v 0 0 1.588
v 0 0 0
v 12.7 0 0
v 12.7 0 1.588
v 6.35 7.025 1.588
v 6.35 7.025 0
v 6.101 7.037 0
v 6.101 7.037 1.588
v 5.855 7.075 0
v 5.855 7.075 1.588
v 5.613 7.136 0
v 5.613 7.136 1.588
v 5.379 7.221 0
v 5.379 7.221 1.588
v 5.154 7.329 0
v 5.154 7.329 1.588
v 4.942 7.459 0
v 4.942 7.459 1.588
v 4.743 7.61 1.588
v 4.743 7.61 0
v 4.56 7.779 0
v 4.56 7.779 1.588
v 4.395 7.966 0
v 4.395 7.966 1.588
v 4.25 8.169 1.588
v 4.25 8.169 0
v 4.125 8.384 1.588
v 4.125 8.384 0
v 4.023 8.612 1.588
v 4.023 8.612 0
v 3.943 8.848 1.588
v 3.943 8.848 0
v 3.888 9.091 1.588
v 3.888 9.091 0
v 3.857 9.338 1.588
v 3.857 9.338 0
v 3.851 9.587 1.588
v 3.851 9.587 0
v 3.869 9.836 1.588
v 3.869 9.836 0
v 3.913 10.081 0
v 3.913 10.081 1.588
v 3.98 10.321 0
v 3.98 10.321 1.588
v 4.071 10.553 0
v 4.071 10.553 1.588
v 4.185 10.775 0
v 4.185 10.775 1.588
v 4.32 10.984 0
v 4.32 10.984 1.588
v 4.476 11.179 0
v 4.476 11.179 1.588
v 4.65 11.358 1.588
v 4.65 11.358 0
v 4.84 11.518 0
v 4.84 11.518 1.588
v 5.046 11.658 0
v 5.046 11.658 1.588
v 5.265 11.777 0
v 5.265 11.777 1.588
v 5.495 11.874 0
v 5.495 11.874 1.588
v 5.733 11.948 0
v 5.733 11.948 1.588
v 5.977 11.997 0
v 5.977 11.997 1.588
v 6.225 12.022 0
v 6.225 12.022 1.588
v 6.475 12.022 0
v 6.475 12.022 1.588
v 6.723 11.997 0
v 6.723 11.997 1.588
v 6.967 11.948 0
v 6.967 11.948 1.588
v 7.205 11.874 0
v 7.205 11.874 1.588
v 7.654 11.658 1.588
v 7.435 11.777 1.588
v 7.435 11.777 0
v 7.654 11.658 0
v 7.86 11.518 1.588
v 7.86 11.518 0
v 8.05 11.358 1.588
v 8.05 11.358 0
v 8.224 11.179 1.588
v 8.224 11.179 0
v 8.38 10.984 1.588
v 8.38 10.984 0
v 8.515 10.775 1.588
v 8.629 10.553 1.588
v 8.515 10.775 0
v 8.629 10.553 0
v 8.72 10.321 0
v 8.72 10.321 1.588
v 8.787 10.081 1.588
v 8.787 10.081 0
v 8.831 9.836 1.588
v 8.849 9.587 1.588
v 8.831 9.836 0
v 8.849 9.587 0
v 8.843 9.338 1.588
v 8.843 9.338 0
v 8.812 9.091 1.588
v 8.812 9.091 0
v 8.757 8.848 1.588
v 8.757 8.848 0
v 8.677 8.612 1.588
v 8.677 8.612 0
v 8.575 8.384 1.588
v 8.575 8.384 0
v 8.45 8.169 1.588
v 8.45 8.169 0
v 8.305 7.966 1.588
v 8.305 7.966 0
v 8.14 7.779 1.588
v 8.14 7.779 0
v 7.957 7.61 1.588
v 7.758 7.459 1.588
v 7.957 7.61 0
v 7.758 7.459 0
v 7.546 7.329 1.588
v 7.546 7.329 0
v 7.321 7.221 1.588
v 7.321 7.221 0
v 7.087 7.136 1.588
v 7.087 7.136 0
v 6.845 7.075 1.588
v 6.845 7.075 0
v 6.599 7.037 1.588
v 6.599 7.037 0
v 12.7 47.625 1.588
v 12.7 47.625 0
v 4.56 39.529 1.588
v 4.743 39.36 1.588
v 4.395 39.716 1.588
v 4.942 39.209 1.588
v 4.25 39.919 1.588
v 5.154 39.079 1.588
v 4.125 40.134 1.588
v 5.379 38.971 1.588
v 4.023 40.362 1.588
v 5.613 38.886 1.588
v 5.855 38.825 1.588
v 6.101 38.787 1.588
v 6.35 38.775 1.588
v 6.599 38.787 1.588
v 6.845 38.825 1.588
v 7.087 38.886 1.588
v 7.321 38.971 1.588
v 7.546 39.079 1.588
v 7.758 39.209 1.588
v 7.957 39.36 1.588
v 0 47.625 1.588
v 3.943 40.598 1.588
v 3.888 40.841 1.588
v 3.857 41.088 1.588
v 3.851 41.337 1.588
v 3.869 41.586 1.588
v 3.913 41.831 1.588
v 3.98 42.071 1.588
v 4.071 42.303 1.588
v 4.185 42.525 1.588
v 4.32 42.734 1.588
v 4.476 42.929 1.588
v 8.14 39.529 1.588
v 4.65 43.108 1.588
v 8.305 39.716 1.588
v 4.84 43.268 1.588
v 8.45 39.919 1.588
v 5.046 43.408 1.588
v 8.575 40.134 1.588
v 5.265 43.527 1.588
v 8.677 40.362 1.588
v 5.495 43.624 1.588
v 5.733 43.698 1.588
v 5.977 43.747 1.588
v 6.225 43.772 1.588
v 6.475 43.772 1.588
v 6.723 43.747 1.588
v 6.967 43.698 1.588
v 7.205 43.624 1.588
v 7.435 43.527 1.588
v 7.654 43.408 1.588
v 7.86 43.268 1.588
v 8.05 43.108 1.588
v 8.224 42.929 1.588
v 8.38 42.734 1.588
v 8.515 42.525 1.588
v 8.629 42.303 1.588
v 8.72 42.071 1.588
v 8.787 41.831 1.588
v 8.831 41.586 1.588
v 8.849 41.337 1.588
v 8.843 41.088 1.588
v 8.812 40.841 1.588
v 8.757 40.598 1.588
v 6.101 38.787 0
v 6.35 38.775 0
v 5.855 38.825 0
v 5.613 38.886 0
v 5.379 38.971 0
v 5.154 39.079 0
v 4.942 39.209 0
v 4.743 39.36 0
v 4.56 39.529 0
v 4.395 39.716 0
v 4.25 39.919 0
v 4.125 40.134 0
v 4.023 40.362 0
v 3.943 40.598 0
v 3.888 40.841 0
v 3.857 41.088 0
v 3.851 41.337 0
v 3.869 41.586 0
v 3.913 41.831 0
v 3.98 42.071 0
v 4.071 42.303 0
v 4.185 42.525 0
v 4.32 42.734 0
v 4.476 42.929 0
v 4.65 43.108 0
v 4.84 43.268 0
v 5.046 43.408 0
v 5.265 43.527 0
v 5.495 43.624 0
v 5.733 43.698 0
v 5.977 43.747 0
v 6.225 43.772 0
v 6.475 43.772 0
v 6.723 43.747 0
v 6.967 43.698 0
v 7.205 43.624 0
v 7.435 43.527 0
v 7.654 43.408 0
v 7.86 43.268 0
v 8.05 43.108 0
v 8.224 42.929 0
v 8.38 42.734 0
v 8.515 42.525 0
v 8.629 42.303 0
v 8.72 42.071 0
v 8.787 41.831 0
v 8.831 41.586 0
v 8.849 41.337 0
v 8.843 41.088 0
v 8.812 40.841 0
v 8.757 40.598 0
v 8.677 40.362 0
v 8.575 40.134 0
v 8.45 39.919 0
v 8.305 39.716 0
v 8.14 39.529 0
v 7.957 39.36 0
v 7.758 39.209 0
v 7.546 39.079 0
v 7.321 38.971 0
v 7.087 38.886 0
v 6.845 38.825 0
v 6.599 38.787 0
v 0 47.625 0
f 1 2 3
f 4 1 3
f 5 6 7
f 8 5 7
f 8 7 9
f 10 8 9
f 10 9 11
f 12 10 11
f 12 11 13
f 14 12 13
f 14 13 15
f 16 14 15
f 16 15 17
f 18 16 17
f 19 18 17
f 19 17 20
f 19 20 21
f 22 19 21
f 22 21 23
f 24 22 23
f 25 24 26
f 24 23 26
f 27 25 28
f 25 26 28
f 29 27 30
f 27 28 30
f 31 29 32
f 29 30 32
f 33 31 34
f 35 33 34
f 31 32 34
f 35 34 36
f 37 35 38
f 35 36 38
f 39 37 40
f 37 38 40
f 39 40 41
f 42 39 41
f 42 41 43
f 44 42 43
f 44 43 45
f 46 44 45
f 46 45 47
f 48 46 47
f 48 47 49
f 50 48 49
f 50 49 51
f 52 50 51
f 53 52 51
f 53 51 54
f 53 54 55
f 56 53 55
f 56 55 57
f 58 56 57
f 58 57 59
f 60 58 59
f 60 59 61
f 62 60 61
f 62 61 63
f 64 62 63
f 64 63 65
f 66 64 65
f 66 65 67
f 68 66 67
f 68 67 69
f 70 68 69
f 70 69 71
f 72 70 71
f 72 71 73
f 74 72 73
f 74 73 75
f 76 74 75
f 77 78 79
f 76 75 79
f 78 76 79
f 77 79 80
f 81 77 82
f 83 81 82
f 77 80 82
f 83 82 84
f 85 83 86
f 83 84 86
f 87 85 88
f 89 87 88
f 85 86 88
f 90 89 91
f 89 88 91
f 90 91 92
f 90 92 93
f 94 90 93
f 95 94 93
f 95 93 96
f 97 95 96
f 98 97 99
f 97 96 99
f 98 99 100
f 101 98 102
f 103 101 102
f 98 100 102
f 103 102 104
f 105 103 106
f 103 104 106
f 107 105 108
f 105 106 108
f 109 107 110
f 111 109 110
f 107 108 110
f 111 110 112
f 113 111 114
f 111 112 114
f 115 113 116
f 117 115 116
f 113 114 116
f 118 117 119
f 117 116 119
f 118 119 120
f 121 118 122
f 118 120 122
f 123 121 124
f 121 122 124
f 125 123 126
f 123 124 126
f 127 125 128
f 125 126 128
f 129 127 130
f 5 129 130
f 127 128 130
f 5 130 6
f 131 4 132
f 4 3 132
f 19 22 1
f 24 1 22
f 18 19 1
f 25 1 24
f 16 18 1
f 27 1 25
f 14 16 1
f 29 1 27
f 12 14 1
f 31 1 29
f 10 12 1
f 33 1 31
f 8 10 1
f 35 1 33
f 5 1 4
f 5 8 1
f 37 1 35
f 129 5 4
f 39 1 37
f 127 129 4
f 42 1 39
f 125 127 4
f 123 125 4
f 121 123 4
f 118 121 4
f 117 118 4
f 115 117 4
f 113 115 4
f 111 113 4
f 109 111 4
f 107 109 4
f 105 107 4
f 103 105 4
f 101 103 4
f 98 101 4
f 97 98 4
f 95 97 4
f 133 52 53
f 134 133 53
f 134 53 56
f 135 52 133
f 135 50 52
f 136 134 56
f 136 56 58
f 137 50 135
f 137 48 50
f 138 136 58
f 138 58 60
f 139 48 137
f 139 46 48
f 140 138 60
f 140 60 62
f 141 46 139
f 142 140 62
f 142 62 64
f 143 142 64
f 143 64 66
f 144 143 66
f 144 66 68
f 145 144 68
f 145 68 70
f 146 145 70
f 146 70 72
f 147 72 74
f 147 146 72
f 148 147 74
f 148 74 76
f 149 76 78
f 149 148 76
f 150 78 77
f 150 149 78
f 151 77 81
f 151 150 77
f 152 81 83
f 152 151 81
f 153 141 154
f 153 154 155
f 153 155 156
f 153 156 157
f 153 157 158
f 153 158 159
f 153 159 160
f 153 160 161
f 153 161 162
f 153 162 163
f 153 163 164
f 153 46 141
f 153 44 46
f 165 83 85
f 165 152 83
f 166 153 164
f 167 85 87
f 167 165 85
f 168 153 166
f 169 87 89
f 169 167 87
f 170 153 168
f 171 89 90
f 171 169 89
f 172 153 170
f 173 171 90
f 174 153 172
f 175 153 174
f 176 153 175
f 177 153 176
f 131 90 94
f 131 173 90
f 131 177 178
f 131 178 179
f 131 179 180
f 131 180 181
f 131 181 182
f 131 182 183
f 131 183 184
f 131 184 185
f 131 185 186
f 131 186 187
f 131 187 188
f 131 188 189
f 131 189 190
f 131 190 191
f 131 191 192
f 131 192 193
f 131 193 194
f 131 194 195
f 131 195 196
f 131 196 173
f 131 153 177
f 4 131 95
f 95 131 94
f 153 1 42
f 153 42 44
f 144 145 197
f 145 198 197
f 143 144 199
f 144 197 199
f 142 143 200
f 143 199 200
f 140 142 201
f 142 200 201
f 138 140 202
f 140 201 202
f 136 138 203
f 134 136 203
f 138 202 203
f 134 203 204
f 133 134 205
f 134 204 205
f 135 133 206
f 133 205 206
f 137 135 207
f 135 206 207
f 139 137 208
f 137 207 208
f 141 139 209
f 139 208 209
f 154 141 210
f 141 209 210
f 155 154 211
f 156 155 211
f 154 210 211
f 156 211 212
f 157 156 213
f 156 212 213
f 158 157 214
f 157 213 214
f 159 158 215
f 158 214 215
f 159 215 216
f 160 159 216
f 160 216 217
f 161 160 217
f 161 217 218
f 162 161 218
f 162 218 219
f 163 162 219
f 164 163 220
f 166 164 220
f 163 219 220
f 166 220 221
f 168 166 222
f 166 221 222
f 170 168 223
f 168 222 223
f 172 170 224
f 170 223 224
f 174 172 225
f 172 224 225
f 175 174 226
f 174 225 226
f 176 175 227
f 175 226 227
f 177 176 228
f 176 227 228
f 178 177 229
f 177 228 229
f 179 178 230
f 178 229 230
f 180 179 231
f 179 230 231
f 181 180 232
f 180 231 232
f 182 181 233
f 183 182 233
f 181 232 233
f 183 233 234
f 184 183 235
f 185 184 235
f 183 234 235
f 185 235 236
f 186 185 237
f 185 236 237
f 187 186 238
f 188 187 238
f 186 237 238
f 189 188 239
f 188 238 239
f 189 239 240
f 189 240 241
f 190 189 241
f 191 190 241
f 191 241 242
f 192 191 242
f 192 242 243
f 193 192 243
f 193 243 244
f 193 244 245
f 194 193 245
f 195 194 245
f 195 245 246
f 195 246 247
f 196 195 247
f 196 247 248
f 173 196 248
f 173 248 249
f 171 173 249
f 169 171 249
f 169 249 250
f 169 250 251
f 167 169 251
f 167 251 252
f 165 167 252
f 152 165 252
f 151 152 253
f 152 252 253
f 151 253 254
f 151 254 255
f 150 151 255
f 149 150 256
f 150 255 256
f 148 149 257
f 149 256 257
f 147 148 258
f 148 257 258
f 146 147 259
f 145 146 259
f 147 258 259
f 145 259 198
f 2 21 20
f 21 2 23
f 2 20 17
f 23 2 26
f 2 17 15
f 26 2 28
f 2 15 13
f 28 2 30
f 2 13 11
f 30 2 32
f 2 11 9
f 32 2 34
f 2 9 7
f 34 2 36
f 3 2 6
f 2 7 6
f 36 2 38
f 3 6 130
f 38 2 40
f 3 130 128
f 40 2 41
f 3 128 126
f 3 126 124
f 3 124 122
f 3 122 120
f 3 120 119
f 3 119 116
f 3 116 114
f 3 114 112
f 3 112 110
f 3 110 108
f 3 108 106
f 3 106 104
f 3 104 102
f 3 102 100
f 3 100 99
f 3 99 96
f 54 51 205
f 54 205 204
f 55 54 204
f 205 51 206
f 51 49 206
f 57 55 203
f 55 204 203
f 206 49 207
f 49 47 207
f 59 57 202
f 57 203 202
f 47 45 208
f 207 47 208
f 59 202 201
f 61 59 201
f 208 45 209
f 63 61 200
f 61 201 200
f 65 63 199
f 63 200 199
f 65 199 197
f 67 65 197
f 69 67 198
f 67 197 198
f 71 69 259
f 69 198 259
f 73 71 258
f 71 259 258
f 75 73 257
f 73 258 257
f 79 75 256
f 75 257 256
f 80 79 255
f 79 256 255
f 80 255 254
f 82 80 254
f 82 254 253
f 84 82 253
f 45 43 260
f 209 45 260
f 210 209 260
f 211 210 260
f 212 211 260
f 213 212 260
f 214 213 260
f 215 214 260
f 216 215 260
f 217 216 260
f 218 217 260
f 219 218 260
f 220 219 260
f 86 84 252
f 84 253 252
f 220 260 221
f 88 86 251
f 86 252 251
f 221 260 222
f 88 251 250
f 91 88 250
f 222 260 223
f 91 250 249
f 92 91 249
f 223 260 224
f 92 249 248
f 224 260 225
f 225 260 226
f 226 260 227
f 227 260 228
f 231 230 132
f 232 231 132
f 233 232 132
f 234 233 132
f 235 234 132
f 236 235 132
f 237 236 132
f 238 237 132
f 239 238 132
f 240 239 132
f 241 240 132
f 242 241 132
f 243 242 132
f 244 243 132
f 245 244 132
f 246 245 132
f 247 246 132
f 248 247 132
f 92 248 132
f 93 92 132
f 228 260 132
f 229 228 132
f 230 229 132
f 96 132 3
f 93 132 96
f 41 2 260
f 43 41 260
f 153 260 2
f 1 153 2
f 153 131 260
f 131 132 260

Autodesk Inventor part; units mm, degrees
ref_plane "YZ Plane" through (0, 0, 0) normal (1, 0, 0) x (0, 1, 0)
ref_plane "XZ Plane" through (0, 0, 0) normal (0, 1, 0) x (-1, 0, 0)
ref_plane "XY Plane" through (0, 0, 0) normal (0, 0, 1) x (1, 0, 0)
sketch "Sketch1" plane through (0, 0, 0) normal (0, 0, 1) x (1, 0, 0)
  line L0 (0, 0) -> (12.7, 0)
  line L1 (12.7, 0) -> (12.7, 47.625)
  line L2 (12.7, 47.625) -> (0, 47.625)
  line L3 (0, 47.625) -> (0, 0)
  dimension "d0" = 47.625
  dimension "d1" = 12.7
extrude "Extrusion1" add sketch "Sketch1" along normal blind 1.5875
sketch "Sketch2" plane through (0, 0, 1.5875) normal (0, 0, 1) x (1, 0, 0)
  line L0 (12.7, 0) -> (12.7, 47.625) projected
  line L1 (12.7, 47.625) -> (0, 47.625) projected
  line L2 (0, 47.625) -> (0, 0) projected
  point P0 (6.35, 41.275)
  point P1 (6.35, 9.525)
  dimension "d4" = 31.75
  dimension "d6" = 6.35
  dimension "d7" = 6.35
  dimension "d8" = 6.35
hole "Hole1" at (6.35, 41.275, 1.5875) at (6.35, 9.525, 1.5875) direction (0, 0, -1) diameter 5 depth 25.4 tip angle 118
properties part number "SpacerBasket"
